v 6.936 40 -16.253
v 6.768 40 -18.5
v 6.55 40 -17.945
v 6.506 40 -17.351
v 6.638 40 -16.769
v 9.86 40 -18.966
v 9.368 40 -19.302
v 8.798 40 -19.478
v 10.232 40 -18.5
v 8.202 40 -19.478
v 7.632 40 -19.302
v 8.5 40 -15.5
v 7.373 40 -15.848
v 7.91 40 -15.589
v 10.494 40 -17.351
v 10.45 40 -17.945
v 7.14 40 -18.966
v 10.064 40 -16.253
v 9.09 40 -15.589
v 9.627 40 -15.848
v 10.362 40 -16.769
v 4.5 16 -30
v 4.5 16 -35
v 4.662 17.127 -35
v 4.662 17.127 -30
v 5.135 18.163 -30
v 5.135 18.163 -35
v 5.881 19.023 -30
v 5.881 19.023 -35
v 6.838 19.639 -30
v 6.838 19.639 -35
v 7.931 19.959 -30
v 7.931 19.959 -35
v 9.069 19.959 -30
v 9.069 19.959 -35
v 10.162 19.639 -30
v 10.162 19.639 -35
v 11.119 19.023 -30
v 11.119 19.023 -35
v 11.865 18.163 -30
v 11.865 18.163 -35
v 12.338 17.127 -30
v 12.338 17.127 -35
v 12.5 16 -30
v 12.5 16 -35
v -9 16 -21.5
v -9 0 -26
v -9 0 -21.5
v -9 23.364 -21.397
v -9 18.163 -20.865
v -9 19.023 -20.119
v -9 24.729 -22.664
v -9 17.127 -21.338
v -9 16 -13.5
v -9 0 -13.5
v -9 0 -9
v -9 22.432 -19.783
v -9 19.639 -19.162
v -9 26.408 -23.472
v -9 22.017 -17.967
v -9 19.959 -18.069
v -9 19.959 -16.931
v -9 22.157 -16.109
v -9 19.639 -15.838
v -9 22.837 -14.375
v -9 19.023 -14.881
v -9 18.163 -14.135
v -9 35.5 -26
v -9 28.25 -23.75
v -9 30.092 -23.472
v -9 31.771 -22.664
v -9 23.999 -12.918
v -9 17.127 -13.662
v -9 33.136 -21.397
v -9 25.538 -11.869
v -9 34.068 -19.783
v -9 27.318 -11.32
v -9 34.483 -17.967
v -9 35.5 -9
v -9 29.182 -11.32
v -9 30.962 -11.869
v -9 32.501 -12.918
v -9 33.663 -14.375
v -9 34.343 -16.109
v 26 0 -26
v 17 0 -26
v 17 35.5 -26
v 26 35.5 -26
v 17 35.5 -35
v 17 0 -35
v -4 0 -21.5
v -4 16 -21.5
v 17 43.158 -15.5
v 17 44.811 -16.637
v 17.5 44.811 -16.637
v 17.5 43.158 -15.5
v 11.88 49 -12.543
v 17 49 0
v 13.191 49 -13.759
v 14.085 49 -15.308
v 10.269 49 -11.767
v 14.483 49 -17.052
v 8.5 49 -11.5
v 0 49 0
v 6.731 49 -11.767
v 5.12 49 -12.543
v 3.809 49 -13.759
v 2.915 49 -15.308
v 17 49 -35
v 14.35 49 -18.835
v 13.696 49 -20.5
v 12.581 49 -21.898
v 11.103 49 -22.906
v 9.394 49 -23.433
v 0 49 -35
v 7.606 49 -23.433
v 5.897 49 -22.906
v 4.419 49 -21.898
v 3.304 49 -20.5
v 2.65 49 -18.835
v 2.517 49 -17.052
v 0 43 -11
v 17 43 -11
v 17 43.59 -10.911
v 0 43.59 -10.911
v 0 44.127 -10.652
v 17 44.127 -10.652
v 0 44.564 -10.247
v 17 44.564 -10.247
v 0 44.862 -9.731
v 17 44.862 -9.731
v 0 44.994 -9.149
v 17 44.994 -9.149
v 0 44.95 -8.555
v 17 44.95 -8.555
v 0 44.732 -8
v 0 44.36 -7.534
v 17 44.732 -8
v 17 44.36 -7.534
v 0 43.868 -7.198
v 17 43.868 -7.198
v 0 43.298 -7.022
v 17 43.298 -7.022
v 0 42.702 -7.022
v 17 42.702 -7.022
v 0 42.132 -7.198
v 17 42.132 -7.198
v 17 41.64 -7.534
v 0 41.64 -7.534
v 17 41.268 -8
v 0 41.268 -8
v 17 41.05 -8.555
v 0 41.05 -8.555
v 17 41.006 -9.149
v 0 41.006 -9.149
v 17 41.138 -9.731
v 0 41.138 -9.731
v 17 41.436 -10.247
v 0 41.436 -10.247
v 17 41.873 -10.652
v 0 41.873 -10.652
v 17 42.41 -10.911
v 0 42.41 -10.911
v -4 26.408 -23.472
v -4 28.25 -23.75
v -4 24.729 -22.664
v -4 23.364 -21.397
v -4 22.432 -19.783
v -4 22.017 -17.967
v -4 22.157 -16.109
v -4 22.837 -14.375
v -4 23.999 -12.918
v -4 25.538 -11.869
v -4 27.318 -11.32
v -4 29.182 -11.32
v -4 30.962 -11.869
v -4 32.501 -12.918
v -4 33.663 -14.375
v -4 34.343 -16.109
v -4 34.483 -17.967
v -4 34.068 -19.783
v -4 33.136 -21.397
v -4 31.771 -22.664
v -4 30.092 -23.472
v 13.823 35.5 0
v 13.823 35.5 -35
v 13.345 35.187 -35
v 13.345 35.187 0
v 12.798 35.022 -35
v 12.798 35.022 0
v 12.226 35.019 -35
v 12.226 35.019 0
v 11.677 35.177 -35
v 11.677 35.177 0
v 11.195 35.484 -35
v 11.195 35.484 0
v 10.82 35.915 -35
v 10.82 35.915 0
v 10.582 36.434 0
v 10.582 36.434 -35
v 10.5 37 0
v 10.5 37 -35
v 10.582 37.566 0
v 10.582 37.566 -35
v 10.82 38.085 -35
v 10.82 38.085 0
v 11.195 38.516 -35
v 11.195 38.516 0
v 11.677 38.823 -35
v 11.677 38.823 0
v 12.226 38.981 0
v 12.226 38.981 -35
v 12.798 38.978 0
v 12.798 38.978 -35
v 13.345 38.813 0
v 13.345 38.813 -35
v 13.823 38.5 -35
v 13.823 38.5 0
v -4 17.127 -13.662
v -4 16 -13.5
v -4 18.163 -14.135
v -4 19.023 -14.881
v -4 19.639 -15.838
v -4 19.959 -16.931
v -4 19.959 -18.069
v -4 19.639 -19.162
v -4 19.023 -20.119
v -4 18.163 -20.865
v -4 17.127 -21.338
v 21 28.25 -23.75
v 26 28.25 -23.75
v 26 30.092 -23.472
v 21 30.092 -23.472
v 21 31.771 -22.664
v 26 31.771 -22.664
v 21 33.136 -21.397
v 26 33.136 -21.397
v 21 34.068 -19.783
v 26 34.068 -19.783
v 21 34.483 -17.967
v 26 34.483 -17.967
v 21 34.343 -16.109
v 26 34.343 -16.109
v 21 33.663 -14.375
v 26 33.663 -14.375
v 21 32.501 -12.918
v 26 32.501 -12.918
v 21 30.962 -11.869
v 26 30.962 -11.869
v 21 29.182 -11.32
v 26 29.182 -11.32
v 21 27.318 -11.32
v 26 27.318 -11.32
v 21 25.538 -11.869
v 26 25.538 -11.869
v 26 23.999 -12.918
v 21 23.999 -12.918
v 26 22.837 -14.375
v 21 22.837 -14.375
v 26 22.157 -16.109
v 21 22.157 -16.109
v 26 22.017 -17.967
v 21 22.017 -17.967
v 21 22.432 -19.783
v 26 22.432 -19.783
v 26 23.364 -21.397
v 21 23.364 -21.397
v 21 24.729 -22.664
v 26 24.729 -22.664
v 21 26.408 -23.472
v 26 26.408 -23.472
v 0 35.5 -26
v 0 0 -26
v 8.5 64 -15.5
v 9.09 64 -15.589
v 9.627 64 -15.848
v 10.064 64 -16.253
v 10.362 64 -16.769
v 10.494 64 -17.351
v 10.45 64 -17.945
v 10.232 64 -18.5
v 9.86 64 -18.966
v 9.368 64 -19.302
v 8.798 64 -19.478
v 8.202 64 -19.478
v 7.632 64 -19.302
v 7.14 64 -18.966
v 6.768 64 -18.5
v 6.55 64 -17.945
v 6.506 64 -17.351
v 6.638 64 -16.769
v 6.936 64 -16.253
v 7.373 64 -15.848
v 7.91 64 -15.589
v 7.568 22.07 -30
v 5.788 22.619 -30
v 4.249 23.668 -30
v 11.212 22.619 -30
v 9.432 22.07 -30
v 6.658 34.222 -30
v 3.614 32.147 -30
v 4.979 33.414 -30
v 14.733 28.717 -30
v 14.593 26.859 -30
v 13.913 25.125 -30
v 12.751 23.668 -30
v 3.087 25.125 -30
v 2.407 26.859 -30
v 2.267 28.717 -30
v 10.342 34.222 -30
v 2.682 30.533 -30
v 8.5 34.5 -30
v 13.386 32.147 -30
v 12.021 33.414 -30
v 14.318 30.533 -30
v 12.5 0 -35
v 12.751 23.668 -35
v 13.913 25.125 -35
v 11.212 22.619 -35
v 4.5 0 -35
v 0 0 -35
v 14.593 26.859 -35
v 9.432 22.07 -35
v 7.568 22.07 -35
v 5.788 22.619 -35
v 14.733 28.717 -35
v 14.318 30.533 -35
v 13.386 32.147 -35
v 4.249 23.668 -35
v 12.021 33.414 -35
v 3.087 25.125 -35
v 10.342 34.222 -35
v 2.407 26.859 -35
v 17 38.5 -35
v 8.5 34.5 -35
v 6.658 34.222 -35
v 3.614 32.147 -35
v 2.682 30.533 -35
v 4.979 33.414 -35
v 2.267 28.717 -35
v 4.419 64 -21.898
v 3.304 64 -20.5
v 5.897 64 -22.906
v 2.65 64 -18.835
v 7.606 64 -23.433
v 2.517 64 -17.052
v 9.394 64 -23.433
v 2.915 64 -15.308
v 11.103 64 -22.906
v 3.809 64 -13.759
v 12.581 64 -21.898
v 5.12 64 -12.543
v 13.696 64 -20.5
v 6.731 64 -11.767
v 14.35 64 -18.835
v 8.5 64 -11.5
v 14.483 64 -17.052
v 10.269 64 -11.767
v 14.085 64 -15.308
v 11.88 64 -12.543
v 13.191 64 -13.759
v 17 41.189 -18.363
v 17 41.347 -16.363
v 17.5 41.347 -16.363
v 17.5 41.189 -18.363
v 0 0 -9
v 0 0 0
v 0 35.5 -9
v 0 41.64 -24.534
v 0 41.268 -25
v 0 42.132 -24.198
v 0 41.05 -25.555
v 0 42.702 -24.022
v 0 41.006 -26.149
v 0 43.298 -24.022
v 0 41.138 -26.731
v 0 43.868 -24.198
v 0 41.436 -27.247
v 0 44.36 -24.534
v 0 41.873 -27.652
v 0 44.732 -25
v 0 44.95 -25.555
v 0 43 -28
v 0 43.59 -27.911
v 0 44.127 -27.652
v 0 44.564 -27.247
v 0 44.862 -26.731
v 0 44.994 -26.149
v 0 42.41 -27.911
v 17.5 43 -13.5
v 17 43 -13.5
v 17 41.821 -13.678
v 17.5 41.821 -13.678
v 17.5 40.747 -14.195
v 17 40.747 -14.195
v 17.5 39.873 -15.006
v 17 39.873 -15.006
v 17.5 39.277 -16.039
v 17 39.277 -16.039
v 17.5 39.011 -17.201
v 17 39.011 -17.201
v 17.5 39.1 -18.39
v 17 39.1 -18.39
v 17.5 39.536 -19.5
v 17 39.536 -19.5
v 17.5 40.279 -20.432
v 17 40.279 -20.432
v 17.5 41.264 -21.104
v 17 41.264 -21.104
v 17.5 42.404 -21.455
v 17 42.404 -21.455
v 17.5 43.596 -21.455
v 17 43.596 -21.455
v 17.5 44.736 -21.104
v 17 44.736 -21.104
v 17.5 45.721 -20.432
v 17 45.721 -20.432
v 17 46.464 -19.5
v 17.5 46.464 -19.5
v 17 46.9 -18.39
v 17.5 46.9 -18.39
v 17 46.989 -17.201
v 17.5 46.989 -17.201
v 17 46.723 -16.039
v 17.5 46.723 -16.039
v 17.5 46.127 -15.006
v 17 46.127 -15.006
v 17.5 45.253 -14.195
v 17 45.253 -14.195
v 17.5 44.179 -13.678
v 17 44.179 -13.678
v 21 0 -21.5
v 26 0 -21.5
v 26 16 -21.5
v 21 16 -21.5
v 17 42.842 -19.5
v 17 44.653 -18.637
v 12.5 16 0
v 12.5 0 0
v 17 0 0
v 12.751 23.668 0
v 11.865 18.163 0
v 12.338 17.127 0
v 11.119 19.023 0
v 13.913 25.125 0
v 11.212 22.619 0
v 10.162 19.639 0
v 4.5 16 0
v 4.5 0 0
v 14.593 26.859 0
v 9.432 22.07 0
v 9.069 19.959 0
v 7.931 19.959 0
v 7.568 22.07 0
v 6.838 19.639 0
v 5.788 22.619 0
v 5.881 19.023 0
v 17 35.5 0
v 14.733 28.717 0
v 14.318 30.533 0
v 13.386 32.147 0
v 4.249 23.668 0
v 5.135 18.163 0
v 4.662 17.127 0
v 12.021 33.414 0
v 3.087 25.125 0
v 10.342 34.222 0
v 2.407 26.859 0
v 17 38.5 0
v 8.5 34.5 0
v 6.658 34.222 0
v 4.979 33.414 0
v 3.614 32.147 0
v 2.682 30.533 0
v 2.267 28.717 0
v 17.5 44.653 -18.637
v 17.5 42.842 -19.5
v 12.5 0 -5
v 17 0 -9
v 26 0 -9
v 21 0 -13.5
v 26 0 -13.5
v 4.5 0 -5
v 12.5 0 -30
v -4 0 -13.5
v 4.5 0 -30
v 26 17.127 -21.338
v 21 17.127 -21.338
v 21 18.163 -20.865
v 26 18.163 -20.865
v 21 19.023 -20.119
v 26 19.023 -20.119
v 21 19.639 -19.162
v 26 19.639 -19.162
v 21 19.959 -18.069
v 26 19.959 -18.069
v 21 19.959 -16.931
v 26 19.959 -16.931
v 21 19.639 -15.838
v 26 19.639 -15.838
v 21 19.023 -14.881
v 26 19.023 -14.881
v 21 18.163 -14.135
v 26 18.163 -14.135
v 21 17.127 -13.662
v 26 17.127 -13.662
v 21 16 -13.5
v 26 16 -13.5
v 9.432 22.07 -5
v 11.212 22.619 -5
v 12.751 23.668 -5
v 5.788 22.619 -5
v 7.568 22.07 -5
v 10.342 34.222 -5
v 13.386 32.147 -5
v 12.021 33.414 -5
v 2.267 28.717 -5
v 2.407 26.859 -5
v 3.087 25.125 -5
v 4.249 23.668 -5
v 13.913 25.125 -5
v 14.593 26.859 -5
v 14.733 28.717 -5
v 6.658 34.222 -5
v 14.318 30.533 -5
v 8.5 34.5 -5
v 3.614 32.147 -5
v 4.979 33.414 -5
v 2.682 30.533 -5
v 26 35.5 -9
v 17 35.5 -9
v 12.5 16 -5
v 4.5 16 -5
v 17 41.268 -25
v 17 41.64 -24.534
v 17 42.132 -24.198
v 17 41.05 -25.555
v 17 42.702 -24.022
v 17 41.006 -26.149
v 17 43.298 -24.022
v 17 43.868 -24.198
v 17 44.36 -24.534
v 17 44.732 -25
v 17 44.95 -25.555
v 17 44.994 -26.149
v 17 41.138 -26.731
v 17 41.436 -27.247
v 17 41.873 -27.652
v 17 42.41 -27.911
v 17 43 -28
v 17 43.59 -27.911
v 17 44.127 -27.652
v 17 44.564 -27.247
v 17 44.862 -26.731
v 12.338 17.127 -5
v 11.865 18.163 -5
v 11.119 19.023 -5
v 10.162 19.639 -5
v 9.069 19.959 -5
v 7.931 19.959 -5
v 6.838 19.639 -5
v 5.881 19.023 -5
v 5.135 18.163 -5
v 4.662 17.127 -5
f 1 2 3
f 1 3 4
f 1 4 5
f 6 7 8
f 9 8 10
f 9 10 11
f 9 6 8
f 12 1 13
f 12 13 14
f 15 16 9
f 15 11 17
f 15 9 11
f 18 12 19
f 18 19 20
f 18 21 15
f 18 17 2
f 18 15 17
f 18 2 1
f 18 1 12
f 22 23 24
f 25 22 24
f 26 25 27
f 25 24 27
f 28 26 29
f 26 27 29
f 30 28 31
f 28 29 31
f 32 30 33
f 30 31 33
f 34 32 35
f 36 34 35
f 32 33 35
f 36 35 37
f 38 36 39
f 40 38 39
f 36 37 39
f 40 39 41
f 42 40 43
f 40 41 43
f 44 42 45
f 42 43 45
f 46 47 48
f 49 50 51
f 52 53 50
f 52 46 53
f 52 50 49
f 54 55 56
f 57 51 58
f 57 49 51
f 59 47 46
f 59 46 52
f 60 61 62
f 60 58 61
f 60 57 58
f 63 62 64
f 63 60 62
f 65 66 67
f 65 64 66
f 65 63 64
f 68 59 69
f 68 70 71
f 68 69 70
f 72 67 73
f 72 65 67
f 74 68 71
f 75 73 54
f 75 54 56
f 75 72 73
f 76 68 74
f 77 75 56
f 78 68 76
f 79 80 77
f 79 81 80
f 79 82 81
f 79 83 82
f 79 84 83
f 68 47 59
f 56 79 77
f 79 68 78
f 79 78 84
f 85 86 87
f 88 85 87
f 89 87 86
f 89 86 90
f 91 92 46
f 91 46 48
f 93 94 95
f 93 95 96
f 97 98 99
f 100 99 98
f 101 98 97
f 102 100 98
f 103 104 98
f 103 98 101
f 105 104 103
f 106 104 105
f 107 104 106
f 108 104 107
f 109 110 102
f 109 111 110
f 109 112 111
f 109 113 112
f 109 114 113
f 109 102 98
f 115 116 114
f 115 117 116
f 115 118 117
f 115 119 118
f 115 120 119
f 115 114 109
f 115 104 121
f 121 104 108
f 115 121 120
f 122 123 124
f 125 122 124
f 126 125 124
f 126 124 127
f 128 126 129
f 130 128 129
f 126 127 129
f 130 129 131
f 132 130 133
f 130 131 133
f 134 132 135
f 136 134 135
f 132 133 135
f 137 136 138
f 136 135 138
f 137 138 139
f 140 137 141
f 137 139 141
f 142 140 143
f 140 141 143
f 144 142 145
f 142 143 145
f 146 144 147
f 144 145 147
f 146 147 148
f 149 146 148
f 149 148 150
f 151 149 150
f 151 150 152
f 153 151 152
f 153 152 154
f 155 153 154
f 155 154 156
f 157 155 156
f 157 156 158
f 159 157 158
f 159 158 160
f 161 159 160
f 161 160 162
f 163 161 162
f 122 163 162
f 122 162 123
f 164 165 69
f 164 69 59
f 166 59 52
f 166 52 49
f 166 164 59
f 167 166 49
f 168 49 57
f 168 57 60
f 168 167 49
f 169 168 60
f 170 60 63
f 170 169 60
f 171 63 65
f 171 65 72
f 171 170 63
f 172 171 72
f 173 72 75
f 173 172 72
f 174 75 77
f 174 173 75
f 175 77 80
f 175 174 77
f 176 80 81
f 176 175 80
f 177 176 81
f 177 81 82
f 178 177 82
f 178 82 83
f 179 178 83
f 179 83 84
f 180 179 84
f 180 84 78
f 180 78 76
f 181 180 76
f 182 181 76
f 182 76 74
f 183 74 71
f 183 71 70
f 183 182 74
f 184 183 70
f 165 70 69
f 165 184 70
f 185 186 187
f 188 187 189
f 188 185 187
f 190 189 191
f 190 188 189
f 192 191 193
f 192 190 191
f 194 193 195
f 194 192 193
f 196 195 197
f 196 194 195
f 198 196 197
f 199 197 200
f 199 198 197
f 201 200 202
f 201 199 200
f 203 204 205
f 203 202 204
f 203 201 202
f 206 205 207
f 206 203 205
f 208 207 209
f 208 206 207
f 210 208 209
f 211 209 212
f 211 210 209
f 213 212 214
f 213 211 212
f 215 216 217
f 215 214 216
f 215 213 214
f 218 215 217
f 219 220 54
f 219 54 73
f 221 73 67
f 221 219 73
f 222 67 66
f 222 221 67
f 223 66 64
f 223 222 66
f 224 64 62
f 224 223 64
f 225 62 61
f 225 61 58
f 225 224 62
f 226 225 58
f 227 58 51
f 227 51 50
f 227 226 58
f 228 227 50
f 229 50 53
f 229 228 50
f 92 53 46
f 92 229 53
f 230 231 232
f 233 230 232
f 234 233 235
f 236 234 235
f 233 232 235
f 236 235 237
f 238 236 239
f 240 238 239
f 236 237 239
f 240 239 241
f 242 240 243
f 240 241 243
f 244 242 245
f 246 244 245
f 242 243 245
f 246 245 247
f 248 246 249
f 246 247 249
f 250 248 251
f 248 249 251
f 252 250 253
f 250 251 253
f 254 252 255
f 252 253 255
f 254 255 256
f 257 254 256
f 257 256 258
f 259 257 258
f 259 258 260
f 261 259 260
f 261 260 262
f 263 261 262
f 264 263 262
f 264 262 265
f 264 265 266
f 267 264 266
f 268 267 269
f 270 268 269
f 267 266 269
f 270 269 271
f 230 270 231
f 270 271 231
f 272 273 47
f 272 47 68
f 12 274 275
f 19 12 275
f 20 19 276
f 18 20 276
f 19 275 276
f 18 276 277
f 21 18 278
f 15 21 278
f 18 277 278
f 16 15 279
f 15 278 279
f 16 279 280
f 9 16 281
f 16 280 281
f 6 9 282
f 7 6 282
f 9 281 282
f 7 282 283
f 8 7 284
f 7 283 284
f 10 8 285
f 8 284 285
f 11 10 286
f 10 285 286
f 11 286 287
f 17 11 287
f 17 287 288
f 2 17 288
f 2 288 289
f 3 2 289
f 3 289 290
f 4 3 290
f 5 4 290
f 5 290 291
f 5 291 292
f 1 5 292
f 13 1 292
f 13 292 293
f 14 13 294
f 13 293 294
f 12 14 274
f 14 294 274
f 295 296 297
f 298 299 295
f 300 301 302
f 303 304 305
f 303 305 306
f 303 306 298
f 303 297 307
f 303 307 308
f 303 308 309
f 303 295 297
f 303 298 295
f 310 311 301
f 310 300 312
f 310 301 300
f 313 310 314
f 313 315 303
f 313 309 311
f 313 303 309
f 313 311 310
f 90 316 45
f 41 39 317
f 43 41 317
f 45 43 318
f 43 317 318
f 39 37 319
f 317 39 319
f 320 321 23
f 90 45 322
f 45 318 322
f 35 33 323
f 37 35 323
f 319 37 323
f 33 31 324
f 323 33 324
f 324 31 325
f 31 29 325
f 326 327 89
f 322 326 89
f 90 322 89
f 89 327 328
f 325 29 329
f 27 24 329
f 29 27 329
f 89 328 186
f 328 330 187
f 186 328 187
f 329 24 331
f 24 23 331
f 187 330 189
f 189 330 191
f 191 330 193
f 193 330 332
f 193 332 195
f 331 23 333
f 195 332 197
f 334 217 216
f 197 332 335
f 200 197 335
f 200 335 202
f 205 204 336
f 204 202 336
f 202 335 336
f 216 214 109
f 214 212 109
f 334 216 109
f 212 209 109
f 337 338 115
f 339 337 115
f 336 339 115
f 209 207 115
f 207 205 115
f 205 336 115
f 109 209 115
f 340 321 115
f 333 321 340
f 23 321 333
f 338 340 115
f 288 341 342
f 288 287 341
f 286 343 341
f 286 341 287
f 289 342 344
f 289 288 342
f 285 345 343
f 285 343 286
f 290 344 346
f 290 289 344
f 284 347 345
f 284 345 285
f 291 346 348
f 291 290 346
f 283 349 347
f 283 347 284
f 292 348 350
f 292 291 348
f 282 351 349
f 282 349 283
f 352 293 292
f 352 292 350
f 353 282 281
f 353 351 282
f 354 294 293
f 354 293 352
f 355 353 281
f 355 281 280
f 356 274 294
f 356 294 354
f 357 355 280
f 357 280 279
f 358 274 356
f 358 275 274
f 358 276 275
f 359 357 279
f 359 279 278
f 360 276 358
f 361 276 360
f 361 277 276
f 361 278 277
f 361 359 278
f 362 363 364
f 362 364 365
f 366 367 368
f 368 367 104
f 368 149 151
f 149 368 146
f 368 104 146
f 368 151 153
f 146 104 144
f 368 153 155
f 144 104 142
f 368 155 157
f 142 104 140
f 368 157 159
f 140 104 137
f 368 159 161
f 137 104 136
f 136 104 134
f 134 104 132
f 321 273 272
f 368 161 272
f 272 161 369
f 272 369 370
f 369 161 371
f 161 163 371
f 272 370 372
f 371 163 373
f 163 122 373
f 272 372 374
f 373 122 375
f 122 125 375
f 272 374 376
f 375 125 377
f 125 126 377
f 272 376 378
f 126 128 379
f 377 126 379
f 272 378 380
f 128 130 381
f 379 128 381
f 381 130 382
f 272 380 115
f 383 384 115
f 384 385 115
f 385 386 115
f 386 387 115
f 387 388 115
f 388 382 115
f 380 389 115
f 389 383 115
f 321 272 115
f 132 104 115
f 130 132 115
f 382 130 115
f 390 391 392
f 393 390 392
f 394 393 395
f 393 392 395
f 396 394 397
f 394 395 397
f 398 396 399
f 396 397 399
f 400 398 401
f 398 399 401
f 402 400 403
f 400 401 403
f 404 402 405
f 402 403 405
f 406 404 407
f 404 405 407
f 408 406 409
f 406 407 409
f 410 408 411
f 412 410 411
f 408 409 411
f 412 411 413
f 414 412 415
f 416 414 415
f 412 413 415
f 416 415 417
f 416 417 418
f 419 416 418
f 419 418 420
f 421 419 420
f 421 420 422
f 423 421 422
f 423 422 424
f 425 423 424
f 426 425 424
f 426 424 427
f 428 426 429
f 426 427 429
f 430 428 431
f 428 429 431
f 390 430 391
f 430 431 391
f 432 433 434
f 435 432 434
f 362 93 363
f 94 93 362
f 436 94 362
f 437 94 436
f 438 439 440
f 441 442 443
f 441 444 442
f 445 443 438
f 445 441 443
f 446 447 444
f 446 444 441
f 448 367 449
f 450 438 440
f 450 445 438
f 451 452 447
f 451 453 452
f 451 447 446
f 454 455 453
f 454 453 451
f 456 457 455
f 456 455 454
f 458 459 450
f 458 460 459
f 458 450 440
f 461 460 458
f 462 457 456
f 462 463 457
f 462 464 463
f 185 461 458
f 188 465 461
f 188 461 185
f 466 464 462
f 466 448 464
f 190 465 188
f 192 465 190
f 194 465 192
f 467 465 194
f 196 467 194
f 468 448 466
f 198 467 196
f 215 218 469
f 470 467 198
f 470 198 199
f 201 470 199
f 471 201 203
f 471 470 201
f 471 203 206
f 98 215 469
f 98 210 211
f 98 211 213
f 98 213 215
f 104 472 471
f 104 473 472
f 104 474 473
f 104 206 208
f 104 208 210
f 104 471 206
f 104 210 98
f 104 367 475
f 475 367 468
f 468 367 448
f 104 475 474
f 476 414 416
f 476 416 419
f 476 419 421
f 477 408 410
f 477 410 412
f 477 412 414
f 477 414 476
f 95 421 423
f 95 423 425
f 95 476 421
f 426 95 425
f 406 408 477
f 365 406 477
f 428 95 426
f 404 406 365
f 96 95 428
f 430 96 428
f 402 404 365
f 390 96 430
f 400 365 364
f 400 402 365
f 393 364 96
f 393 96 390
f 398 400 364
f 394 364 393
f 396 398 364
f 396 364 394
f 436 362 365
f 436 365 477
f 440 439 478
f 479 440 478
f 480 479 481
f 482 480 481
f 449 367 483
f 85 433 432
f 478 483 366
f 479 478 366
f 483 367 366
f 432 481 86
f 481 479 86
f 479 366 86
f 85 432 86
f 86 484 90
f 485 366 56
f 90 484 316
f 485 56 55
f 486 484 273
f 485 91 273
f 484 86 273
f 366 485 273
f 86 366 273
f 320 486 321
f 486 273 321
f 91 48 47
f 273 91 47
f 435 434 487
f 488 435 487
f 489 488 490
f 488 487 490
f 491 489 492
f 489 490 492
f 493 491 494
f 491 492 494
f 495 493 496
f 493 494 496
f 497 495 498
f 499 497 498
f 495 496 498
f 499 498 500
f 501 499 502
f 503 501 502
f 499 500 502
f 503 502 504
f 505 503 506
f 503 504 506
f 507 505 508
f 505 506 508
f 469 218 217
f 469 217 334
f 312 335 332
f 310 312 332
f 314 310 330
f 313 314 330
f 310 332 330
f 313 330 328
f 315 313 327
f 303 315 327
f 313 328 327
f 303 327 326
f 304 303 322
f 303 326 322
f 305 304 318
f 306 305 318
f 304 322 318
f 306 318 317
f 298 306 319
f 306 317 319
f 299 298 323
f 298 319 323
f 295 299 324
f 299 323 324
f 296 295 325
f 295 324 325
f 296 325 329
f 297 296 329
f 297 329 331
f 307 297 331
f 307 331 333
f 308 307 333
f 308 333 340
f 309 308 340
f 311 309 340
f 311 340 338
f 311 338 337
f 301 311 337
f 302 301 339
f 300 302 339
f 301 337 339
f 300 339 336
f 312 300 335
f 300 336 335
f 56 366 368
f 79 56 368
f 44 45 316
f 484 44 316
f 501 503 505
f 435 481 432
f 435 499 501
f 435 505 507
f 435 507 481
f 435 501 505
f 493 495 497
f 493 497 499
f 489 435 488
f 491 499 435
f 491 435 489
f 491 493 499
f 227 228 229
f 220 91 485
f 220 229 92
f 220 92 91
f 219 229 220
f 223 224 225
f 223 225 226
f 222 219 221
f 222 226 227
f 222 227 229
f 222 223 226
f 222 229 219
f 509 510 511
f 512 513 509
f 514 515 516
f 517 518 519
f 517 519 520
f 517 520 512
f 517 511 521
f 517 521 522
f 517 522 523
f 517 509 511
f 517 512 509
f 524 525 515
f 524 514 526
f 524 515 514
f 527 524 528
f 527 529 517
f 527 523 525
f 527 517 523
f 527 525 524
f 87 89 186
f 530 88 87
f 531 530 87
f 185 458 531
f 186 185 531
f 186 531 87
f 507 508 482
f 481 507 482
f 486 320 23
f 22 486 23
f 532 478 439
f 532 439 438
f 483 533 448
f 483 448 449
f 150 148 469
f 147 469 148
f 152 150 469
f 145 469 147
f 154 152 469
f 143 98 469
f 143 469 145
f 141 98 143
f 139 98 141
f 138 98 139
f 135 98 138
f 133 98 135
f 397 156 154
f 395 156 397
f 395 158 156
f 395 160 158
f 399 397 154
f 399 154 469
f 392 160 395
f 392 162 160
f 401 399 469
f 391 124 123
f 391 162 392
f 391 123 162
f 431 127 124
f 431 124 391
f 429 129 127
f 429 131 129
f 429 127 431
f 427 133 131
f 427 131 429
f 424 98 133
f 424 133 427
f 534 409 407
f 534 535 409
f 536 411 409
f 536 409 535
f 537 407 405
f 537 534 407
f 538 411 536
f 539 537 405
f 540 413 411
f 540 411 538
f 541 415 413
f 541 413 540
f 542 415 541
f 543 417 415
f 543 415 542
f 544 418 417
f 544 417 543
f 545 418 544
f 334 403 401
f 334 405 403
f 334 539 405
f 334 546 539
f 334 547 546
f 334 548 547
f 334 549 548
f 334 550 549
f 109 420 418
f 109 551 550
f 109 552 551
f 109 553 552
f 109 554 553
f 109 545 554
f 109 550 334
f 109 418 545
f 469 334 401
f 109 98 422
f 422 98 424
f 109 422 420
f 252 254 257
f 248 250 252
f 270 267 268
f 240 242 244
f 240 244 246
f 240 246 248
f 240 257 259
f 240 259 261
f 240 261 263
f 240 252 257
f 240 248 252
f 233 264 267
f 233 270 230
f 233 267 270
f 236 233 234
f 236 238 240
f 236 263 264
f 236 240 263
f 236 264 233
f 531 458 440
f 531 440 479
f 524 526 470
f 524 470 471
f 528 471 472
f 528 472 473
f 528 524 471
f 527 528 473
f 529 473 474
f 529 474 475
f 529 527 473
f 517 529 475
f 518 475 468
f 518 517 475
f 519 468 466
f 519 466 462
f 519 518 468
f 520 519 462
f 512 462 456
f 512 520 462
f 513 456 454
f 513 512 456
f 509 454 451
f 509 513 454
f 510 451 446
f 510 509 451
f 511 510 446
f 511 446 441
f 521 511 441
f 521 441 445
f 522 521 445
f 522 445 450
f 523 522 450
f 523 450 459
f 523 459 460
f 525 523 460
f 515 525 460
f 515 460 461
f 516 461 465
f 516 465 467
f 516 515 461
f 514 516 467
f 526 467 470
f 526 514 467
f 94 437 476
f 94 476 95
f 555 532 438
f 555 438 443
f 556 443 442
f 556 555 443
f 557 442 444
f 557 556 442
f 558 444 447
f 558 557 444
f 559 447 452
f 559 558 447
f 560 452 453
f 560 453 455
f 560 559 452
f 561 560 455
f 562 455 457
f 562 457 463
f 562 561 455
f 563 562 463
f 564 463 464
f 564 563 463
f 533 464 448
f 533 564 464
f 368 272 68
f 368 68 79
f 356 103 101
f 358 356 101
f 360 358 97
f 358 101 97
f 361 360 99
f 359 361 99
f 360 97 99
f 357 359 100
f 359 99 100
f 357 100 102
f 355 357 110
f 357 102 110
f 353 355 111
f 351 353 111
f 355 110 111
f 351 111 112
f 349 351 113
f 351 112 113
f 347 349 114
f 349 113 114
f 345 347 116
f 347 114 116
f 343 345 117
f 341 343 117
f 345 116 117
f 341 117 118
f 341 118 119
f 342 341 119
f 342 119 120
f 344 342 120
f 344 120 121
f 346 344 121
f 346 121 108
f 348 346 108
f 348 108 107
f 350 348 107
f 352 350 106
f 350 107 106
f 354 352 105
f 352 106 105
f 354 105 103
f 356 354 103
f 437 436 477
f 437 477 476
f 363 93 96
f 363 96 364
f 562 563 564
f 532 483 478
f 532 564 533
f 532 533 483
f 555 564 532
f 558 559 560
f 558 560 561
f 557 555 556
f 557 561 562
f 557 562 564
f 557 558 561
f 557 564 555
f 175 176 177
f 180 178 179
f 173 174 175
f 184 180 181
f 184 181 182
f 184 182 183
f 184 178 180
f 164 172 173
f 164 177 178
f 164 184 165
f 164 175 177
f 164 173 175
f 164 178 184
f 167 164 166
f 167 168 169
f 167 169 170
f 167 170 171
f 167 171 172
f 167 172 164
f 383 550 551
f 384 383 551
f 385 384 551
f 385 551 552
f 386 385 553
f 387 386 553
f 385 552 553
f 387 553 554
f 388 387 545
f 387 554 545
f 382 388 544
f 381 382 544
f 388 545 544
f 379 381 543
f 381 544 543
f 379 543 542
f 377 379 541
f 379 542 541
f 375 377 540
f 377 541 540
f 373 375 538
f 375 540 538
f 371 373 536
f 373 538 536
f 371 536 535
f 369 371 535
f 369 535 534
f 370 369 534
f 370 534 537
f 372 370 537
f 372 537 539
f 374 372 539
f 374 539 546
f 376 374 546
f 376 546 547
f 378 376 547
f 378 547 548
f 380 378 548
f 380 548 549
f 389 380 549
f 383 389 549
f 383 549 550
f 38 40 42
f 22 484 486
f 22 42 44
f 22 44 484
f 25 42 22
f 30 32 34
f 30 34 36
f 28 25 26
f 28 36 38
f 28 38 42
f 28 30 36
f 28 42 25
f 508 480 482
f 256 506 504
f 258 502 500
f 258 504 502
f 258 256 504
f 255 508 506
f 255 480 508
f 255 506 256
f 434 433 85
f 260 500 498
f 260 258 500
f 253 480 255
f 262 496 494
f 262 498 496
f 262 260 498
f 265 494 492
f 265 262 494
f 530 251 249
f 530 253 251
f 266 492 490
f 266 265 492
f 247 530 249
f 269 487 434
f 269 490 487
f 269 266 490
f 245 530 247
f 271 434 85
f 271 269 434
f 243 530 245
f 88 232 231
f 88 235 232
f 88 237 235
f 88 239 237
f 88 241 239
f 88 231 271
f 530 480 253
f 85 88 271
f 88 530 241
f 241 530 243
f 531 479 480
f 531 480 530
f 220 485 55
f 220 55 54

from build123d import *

# Parameters (mm, degrees)
SKETCH1_W           = 35
SKETCH1_H           = 49
BOSS_EXTRUDE1_DEPTH = 17
SKETCH2_R           = 2
CUT_EXTRUDE1_DEPTH  = 37
SKETCH3_W           = 17
SKETCH3_H           = 35.5
BOSS_EXTRUDE2_DEPTH = 9
SKETCH4_W           = 17
SKETCH4_H           = 35.5
BOSS_EXTRUDE3_DEPTH = 9
CUT_EXTRUDE2_DEPTH  = 59
SKETCH6_R           = 6.25
CUT_EXTRUDE3_DEPTH  = 5
CUT_EXTRUDE4_START  = -5
SKETCH7_R           = 6.25
CUT_EXTRUDE4_DEPTH  = 5
SKETCH8_R           = 6.25
CUT_EXTRUDE5_DEPTH  = 5
CUT_EXTRUDE6_START  = -5
SKETCH9_R           = 6.25
CUT_EXTRUDE6_DEPTH  = 5
SKETCH10_R          = 4
BOSS_EXTRUDE4_DEPTH = 0.5
CUT_EXTRUDE7_DEPTH  = 5
CUT_EXTRUDE8_START  = -5
CUT_EXTRUDE8_DEPTH  = 5
CUT_EXTRUDE9_DEPTH  = 5
CUT_EXTRUDE10_START = -5
CUT_EXTRUDE10_DEPTH = 5
SKETCH15_R          = 6
BOSS_EXTRUDE5_DEPTH = 15
SKETCH19_R          = 2
CUT_EXTRUDE11_DEPTH = 24


with BuildPart() as part:
    # Sketch1 → Boss-Extrude1 (new body)
    with BuildSketch(Plane(origin=(0, 0, 0), x_dir=(0, 0, -1), z_dir=(1, 0, 0))):
        with Locations((17.5, 24.5)):
            Rectangle(SKETCH1_W, SKETCH1_H)
    extrude(amount=BOSS_EXTRUDE1_DEPTH)

    # Sketch2 → Cut-Extrude1 (cut)
    with BuildSketch(Plane(origin=(17, 0, 0), x_dir=(0, 0, -1), z_dir=(1, 0, 0))):
        with Locations((9, 43)):
            Circle(SKETCH2_R)
        with Locations((26, 43)):
            Circle(SKETCH2_R)
    extrude(amount=-CUT_EXTRUDE1_DEPTH, mode=Mode.SUBTRACT)

    # Sketch3 → Boss-Extrude2 (add)
    with BuildSketch(Plane(origin=(17, 0, 0), x_dir=(0, 0, -1), z_dir=(1, 0, 0))):
        with Locations((17.5, 17.75)):
            Rectangle(SKETCH3_W, SKETCH3_H)
    extrude(amount=BOSS_EXTRUDE2_DEPTH)

    # Sketch4 → Boss-Extrude3 (add)
    with BuildSketch(Plane.ZY):
        with Locations((-17.5, 17.75)):
            Rectangle(SKETCH4_W, SKETCH4_H)
    extrude(amount=BOSS_EXTRUDE3_DEPTH)

    # Sketch5 → Cut-Extrude2 (cut)
    with BuildSketch(Plane.XY):
        with BuildLine():
            Line((17, 35.5), (13.822875656, 35.5))
            ThreePointArc((13.822875656, 35.5), (10.5, 37), (13.822875656, 38.5))
            Line((13.822875656, 38.5), (17, 38.5))
            Line((17, 38.5), (17, 35.5))
        make_face()
    extrude(amount=-CUT_EXTRUDE2_DEPTH, mode=Mode.SUBTRACT)

    # Sketch6 → Cut-Extrude3 (cut)
    with BuildSketch(Plane(origin=(26, 0, 0), x_dir=(0, 0, -1), z_dir=(1, 0, 0))):
        with Locations((17.5, 28.25)):
            Circle(SKETCH6_R)
    extrude(amount=-CUT_EXTRUDE3_DEPTH, mode=Mode.SUBTRACT)

    # Sketch7 → Cut-Extrude4 (cut)
    with BuildSketch(Plane.ZY.offset(9).offset(CUT_EXTRUDE4_START)):
        with Locations(Location((-17.5, 28.25, 0), (0, 0, 180))):
            Circle(SKETCH7_R)
    extrude(amount=CUT_EXTRUDE4_DEPTH, mode=Mode.SUBTRACT)

    # Sketch8 → Cut-Extrude5 (cut)
    with BuildSketch(Plane(origin=(0, 0, -35), x_dir=(-1, 0, 0), z_dir=(0, 0, -1))):
        with Locations(Location((-8.5, 28.25, 0), (0, 0, 90))):
            Circle(SKETCH8_R)
    extrude(amount=-CUT_EXTRUDE5_DEPTH, mode=Mode.SUBTRACT)

    # Sketch9 → Cut-Extrude6 (cut)
    with BuildSketch(Plane.XY.offset(CUT_EXTRUDE6_START)):
        with Locations(Location((8.5, 28.25, 0), (0, 0, 90))):
            Circle(SKETCH9_R)
    extrude(amount=CUT_EXTRUDE6_DEPTH, mode=Mode.SUBTRACT)

    # Sketch10 → Boss-Extrude4 (add)
    with BuildSketch(Plane(origin=(17, 0, 0), x_dir=(0, 0, -1), z_dir=(1, 0, 0))):
        with Locations(Location((17.5, 43, 0), (0, 0, 180))):
            Circle(SKETCH10_R)
        Polygon((18.636585466, 44.653193152), (16.636585466, 44.810908463), (15.5, 43.157715311), (16.363414534, 41.346806848), (18.363414534, 41.189091537), (19.5, 42.842284689), align=None, mode=Mode.SUBTRACT)
    extrude(amount=BOSS_EXTRUDE4_DEPTH)

    # Sketch11 → Cut-Extrude7 (cut)
    with BuildSketch(Plane(origin=(26, 0, 0), x_dir=(0, 0, -1), z_dir=(1, 0, 0))):
        with BuildLine():
            Line((13.5, 0), (21.5, 0))
            Line((21.5, 0), (21.5, 16))
            ThreePointArc((21.5, 16), (17.5, 20), (13.5, 16))
            Line((13.5, 16), (13.5, 0))
        make_face()
    extrude(amount=-CUT_EXTRUDE7_DEPTH, mode=Mode.SUBTRACT)

    # Sketch12 → Cut-Extrude8 (cut)
    with BuildSketch(Plane.ZY.offset(9).offset(CUT_EXTRUDE8_START)):
        with BuildLine():
            Line((-21.5, 0), (-13.5, 0))
            Line((-13.5, 0), (-13.5, 16))
            ThreePointArc((-13.5, 16), (-17.5, 20), (-21.5, 16))
            Line((-21.5, 16), (-21.5, 0))
        make_face()
    extrude(amount=CUT_EXTRUDE8_DEPTH, mode=Mode.SUBTRACT)

    # Sketch13 → Cut-Extrude9 (cut)
    with BuildSketch(Plane(origin=(0, 0, -35), x_dir=(-1, 0, 0), z_dir=(0, 0, -1))):
        with BuildLine():
            Line((-12.5, 0), (-4.5, 0))
            Line((-4.5, 0), (-4.5, 16))
            ThreePointArc((-4.5, 16), (-8.5, 20), (-12.5, 16))
            Line((-12.5, 16), (-12.5, 0))
        make_face()
    extrude(amount=-CUT_EXTRUDE9_DEPTH, mode=Mode.SUBTRACT)

    # Sketch14 → Cut-Extrude10 (cut)
    with BuildSketch(Plane.XY.offset(CUT_EXTRUDE10_START)):
        with BuildLine():
            Line((4.5, 0), (12.5, 0))
            Line((12.5, 0), (12.5, 16))
            ThreePointArc((12.5, 16), (8.5, 20), (4.5, 16))
            Line((4.5, 16), (4.5, 0))
        make_face()
    extrude(amount=CUT_EXTRUDE10_DEPTH, mode=Mode.SUBTRACT)

    # Sketch15 → Boss-Extrude5 (add)
    with BuildSketch(Plane(origin=(0, 49, 0), x_dir=(1, 0, 0), z_dir=(0, 1, 0))):
        with Locations(Location((8.5, 17.5, 0), (0, 0, 270))):
            Circle(SKETCH15_R)
    extrude(amount=BOSS_EXTRUDE5_DEPTH)

    # Sketch19 → Cut-Extrude11 (cut)
    with BuildSketch(Plane(origin=(0, 64, 0), x_dir=(1, 0, 0), z_dir=(0, 1, 0))):
        with Locations(Location((8.5, 17.5, 0), (0, 0, 270))):
            Circle(SKETCH19_R)
    extrude(amount=-CUT_EXTRUDE11_DEPTH, mode=Mode.SUBTRACT)


solid = part.part
